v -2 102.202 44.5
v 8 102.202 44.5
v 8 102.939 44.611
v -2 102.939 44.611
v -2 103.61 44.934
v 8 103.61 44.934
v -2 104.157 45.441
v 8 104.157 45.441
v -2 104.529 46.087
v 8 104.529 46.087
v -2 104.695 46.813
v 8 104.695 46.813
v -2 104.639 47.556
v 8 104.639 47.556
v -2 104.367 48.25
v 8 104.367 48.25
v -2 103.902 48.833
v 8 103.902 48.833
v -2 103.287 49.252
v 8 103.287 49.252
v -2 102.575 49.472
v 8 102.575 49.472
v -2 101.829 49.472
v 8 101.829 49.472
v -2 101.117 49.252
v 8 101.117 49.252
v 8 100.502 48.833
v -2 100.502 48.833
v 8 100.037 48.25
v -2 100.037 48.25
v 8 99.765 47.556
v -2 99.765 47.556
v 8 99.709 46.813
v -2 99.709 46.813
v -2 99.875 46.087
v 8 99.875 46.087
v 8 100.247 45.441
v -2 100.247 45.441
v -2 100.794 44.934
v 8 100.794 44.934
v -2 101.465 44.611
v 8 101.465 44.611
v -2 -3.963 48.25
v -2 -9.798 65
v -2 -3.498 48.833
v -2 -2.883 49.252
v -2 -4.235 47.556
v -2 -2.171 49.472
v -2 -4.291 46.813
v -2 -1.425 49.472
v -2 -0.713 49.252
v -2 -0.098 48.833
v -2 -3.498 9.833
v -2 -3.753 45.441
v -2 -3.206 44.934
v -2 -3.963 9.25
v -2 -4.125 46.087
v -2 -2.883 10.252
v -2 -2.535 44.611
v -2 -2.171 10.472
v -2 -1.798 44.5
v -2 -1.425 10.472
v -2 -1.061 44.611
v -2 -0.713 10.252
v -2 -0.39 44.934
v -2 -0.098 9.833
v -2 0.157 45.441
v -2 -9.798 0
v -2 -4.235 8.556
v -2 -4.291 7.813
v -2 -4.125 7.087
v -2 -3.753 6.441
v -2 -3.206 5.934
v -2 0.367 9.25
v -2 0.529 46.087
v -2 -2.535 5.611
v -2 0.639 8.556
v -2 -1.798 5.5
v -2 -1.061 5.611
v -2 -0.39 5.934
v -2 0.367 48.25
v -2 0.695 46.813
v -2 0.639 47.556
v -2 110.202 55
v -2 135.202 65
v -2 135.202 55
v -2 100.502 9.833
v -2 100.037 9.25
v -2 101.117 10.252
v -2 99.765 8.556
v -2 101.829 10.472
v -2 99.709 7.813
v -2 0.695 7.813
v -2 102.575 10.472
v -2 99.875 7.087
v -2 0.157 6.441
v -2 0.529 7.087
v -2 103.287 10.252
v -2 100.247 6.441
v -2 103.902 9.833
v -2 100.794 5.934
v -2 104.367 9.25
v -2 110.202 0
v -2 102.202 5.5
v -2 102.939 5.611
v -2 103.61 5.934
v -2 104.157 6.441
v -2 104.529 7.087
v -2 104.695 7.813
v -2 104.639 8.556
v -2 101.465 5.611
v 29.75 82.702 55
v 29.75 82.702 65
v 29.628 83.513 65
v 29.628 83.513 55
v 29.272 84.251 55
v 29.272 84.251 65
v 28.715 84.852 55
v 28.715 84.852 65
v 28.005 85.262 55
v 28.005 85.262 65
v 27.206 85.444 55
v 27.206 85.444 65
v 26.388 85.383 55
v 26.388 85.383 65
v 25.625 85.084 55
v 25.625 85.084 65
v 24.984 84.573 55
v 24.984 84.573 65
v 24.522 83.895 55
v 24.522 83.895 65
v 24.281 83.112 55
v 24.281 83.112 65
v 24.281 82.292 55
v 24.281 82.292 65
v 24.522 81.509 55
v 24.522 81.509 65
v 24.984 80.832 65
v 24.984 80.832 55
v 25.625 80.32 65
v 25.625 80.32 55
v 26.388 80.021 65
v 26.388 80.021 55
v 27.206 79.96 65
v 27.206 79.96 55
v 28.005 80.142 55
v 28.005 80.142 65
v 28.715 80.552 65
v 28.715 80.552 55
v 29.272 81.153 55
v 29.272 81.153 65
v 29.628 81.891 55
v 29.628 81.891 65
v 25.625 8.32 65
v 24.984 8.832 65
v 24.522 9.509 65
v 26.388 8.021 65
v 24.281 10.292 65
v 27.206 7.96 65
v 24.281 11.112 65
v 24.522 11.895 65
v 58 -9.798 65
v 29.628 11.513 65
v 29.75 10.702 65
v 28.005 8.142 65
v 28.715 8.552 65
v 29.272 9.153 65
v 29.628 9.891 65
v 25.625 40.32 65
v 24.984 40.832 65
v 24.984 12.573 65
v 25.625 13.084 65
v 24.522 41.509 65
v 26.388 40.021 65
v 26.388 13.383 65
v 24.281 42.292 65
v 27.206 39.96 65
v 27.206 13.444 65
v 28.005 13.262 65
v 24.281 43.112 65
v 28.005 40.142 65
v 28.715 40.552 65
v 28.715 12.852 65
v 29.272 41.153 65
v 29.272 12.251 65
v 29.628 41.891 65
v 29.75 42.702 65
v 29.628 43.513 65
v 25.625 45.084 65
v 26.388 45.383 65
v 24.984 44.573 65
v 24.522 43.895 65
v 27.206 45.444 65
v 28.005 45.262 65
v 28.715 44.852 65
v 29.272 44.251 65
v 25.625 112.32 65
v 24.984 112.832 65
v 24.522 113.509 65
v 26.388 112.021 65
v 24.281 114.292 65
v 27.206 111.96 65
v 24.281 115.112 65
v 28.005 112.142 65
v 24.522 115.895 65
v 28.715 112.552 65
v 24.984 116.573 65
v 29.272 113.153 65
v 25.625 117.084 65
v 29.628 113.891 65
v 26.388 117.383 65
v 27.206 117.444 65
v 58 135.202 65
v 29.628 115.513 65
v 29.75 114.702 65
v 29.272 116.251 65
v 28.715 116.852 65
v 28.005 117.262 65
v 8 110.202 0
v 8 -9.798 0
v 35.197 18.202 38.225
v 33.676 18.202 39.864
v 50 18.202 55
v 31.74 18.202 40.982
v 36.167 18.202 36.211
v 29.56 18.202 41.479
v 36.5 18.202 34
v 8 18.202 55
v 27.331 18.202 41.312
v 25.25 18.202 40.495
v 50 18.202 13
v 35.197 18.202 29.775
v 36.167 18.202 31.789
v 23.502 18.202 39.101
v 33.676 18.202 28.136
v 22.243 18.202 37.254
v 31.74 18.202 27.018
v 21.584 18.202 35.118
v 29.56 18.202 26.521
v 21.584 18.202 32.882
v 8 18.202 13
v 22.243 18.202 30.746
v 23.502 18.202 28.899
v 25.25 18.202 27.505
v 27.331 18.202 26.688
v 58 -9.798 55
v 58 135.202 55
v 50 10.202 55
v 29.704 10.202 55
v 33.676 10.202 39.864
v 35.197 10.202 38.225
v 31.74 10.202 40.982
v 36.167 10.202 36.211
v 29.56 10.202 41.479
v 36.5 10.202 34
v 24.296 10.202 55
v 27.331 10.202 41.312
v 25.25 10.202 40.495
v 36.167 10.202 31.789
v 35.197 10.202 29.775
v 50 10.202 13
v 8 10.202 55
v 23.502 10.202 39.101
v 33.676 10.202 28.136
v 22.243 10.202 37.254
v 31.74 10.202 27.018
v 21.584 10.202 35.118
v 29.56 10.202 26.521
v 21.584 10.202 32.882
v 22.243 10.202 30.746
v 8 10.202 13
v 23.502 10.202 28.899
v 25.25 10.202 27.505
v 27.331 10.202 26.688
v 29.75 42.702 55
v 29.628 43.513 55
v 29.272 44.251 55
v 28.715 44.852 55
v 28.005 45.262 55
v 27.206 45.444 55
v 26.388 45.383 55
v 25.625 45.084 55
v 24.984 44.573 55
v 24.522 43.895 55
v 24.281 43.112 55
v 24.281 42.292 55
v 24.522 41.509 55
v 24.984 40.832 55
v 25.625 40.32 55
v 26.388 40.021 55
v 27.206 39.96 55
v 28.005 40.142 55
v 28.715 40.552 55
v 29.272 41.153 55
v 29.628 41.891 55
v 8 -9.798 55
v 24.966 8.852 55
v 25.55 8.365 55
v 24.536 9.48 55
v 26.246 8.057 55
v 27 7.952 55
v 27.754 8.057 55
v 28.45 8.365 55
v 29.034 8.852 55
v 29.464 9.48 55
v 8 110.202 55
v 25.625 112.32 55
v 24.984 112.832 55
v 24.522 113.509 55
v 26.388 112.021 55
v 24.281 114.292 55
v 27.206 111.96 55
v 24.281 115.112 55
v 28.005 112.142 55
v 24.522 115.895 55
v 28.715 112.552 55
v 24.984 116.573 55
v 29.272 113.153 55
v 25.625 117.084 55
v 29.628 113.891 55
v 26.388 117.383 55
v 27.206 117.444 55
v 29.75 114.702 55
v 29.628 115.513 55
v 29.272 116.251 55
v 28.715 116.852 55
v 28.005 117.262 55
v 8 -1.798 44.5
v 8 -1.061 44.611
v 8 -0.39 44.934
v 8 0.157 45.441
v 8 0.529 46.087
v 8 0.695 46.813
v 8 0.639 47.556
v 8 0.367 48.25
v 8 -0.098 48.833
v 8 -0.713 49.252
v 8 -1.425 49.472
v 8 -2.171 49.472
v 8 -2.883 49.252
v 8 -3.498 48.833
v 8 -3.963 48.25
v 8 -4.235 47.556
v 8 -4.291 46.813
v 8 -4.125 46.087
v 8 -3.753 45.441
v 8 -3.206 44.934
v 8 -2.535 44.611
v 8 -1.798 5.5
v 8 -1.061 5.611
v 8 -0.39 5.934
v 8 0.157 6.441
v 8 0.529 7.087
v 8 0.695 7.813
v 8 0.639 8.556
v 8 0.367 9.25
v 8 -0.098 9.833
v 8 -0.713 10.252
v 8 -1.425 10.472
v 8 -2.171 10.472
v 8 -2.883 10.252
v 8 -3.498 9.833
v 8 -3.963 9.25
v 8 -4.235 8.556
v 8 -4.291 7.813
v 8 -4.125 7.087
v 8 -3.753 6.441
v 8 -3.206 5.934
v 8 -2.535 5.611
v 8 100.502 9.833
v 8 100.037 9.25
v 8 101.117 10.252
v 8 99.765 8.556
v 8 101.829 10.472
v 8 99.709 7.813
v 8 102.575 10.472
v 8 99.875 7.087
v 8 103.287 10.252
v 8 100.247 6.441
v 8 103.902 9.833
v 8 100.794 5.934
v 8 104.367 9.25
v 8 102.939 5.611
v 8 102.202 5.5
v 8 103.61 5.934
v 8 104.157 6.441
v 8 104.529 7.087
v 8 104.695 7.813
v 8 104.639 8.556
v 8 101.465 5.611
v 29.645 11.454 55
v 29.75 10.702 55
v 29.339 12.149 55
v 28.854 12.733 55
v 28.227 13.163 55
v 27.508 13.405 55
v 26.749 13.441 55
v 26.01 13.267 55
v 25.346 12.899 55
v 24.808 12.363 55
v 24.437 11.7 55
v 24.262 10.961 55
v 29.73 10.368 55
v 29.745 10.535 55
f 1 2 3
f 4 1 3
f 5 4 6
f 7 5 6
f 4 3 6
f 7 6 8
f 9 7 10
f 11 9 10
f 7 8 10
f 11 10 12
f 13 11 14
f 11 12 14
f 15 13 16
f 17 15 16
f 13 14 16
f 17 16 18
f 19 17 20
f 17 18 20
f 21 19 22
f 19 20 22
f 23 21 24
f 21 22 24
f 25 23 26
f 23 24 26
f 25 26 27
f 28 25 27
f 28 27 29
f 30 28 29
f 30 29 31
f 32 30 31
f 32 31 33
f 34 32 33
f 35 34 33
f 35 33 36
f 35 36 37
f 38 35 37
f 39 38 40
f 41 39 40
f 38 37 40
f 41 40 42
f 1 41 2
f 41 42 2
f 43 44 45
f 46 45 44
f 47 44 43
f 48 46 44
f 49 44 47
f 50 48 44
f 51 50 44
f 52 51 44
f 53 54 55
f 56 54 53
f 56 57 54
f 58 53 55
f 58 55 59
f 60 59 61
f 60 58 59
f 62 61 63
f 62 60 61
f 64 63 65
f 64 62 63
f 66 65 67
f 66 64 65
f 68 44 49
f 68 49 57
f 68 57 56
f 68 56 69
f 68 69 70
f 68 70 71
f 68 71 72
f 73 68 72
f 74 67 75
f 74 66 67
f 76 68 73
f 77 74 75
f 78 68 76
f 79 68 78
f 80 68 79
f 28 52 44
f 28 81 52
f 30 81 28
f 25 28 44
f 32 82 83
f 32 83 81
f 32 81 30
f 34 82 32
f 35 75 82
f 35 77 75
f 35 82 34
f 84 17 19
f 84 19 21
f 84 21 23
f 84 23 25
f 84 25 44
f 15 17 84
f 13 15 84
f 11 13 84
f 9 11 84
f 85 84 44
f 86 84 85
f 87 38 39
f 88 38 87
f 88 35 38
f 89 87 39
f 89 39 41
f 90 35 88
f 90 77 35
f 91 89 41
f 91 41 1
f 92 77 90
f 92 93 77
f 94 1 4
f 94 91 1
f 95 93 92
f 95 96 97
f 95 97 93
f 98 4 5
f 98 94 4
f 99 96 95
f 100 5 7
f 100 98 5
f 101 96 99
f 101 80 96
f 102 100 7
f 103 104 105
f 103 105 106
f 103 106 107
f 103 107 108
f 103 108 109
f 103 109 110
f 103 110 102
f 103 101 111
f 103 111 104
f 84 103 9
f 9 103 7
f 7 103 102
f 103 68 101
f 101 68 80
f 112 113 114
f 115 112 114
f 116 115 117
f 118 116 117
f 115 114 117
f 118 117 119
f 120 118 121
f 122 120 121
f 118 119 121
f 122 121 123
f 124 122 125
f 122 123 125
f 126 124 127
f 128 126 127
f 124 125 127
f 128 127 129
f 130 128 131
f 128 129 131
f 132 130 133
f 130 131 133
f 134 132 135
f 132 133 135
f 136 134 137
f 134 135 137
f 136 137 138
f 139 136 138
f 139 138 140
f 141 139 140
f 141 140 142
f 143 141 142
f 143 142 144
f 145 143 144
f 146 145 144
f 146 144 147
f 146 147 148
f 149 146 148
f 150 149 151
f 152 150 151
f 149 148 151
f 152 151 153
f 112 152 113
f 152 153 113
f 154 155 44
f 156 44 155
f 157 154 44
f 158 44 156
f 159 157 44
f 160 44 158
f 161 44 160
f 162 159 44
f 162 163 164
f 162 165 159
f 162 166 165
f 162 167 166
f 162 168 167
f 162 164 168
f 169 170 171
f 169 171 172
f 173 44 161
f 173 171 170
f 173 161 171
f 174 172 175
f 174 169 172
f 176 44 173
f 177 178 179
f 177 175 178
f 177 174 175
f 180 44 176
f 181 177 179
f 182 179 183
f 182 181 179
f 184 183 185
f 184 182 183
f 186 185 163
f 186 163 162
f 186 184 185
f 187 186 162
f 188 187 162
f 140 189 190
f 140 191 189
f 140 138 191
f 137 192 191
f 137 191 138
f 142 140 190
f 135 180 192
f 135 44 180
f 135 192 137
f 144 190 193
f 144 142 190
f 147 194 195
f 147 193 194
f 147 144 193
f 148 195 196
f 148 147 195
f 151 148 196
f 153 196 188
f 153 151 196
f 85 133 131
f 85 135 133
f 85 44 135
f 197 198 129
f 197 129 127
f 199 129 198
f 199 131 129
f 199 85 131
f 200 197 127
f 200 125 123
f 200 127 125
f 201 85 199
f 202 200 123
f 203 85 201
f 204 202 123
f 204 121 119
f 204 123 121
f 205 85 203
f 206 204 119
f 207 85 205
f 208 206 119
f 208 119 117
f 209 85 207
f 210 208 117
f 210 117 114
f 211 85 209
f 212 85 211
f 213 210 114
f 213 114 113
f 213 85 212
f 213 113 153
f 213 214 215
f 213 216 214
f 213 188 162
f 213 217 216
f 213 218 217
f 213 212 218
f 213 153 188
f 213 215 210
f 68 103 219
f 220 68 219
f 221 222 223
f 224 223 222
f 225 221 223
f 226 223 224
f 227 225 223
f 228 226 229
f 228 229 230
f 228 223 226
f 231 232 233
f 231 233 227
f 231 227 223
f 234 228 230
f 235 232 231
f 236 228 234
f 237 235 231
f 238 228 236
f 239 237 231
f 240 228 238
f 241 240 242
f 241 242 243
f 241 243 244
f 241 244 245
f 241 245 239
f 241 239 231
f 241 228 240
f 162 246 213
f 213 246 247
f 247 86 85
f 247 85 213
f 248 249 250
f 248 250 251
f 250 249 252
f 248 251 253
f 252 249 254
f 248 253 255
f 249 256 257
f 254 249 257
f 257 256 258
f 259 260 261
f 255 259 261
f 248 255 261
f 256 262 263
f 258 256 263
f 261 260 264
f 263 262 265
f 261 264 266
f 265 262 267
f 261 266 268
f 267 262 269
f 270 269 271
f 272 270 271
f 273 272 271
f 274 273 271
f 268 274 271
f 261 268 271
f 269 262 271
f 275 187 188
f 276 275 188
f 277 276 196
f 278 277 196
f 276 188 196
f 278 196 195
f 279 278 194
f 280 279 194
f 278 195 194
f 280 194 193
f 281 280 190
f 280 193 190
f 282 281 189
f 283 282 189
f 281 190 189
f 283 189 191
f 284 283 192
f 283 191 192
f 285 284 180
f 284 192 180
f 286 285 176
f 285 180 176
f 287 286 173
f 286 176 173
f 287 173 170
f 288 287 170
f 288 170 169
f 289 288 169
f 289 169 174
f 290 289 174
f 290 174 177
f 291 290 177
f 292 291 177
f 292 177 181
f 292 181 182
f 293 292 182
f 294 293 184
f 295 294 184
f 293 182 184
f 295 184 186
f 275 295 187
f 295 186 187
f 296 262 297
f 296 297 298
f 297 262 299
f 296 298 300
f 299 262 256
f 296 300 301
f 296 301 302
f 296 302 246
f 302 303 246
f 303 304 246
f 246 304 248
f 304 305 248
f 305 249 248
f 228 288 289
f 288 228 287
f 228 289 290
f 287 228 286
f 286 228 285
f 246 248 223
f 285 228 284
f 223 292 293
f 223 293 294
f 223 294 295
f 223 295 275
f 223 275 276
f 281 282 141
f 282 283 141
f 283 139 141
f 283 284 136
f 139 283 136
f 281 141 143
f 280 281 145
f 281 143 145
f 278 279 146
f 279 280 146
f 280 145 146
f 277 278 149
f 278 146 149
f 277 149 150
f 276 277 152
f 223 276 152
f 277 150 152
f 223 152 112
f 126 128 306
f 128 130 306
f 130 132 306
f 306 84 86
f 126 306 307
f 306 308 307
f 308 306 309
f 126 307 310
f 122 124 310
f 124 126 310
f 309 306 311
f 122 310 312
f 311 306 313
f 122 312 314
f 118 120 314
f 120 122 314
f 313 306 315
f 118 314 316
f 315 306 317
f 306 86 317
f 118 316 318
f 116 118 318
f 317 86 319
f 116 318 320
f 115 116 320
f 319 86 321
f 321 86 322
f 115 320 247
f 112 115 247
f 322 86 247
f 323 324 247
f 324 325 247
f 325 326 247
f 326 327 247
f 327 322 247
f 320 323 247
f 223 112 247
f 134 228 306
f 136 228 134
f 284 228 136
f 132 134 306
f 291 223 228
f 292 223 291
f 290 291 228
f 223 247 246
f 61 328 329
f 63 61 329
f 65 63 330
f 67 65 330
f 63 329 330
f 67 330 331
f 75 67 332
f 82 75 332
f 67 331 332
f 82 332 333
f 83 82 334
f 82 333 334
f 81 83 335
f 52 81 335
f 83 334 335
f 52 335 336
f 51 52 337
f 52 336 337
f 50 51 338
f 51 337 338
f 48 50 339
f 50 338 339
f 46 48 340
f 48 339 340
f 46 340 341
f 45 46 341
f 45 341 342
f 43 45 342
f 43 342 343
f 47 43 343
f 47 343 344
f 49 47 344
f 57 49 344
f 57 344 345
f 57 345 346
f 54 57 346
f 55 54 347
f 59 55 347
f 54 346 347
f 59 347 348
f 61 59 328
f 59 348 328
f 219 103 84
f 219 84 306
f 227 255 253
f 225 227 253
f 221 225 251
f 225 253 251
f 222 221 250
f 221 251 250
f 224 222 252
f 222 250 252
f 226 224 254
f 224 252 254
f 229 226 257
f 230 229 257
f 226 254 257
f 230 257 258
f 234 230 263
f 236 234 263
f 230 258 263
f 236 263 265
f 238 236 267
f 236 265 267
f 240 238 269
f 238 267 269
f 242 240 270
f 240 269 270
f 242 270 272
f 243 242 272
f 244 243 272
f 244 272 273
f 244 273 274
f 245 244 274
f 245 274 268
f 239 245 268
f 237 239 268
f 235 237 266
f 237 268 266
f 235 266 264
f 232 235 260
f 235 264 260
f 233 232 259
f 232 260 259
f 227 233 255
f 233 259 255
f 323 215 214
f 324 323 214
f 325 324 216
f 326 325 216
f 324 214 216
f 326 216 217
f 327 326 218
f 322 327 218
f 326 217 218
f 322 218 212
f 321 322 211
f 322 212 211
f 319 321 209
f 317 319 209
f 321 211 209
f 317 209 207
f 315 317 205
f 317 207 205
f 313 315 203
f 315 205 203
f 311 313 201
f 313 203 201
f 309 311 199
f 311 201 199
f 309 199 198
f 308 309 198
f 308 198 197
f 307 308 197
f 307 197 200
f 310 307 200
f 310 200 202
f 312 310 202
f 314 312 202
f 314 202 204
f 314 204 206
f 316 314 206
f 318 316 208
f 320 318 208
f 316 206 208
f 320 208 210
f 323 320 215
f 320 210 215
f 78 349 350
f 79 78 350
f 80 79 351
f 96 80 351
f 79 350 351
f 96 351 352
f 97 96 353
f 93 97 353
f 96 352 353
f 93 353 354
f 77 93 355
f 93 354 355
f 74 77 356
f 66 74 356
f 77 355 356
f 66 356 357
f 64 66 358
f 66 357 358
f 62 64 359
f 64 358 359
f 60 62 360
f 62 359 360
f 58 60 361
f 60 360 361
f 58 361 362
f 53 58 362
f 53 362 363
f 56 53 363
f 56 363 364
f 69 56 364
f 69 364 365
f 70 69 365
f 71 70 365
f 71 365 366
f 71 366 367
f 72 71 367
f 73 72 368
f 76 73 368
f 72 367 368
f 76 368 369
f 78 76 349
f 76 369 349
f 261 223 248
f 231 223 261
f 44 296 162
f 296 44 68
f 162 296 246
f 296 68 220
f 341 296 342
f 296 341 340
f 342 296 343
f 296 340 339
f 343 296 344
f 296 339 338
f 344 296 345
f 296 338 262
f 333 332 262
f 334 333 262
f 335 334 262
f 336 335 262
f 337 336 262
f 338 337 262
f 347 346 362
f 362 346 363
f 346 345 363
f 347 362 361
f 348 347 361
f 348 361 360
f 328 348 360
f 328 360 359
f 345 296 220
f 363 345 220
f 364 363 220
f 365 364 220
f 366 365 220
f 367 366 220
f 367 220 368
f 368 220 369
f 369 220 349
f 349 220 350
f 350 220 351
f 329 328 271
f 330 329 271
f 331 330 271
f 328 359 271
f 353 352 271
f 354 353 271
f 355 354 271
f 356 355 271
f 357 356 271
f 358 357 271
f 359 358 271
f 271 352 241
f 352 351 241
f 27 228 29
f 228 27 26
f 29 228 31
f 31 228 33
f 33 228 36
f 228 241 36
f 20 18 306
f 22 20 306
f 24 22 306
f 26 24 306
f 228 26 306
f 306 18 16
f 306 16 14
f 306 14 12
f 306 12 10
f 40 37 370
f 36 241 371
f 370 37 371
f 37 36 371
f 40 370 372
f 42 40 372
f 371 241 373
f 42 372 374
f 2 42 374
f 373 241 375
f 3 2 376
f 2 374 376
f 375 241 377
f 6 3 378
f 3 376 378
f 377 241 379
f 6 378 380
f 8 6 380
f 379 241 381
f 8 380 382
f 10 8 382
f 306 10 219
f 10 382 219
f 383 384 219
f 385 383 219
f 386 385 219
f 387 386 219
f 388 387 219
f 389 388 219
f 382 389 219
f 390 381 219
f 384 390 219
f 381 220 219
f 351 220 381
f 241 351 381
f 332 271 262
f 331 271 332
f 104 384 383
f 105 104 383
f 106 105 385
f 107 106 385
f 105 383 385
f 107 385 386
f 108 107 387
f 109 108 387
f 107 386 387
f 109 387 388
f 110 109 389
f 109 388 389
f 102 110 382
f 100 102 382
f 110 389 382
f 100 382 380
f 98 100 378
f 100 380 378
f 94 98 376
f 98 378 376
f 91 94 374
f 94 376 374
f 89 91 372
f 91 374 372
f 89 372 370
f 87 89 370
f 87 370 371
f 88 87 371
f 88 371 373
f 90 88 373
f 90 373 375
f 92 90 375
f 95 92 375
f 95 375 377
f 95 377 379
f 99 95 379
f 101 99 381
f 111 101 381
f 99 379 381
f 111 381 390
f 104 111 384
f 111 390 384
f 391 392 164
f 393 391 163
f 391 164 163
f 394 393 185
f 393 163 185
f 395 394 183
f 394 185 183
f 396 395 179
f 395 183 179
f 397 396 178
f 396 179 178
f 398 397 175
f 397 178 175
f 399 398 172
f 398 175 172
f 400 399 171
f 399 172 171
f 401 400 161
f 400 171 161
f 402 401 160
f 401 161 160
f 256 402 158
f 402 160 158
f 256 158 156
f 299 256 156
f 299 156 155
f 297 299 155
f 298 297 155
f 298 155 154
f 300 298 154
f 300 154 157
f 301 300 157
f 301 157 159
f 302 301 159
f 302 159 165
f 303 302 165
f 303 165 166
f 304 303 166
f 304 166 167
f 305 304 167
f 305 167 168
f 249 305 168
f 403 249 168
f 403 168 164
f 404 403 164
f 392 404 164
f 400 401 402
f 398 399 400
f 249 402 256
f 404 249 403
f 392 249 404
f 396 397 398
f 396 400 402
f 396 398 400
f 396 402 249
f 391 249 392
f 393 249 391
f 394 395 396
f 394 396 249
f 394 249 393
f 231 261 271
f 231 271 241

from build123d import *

# Parameters (mm, degrees)
SKETCH1_W           = 10
SKETCH1_H           = 120
BOSS_EXTRUDE1_DEPTH = 55
SKETCH2_W           = 42
SKETCH2_H           = 8
BOSS_EXTRUDE2_DEPTH = 42
SKETCH3_R           = 7.5
CUT_EXTRUDE1_DEPTH  = 8
SKETCH5_W           = 60
SKETCH5_H           = 145
BOSS_EXTRUDE4_DEPTH = 10
SKETCH6_R           = 2.75
CUT_EXTRUDE2_DEPTH  = 10
SKETCH7_R           = 2.5
CUT_EXTRUDE3_DEPTH  = 10


with BuildPart() as part:
    # Sketch1 → Boss-Extrude1 (new body)
    with BuildSketch(Plane.XY):
        with Locations((3, 50.202041029)):
            Rectangle(SKETCH1_W, SKETCH1_H)
    extrude(amount=BOSS_EXTRUDE1_DEPTH)

    # Sketch2 → Boss-Extrude2 (add)
    with BuildSketch(Plane(origin=(8, 0, 0), x_dir=(0, 0, -1), z_dir=(1, 0, 0))):
        with Locations((-34, 14.202041029)):
            Rectangle(SKETCH2_W, SKETCH2_H)
    extrude(amount=BOSS_EXTRUDE2_DEPTH)

    # Sketch3 → Cut-Extrude1 (cut)
    with BuildSketch(Plane.XZ.offset(-10.202041029)):
        with Locations((29, 34)):
            Circle(SKETCH3_R)
    extrude(amount=-CUT_EXTRUDE1_DEPTH, mode=Mode.SUBTRACT)

    # Sketch5 → Boss-Extrude4 (add)
    with BuildSketch(Plane.XY.offset(55)):
        with Locations((28, 62.702041029)):
            Rectangle(SKETCH5_W, SKETCH5_H)
    extrude(amount=BOSS_EXTRUDE4_DEPTH)

    # Sketch6 → Cut-Extrude2 (cut)
    with BuildSketch(Plane.XY.offset(65)):
        with Locations((27, 114.702041029)):
            Circle(SKETCH6_R)
        with Locations((27, 82.702041029)):
            Circle(SKETCH6_R)
        with Locations((27, 42.702041029)):
            Circle(SKETCH6_R)
        with Locations((27, 10.702041029)):
            Circle(SKETCH6_R)
    extrude(amount=-CUT_EXTRUDE2_DEPTH, mode=Mode.SUBTRACT)

    # Sketch7 → Cut-Extrude3 (cut)
    with BuildSketch(Plane(origin=(8, 0, 0), x_dir=(0, 0, -1), z_dir=(1, 0, 0))):
        with Locations((-47, 102.202041029)):
            Circle(SKETCH7_R)
        with Locations((-8, 102.202041029)):
            Circle(SKETCH7_R)
        with Locations((-47, -1.797958971)):
            Circle(SKETCH7_R)
        with Locations((-8, -1.797958971)):
            Circle(SKETCH7_R)
    extrude(amount=-CUT_EXTRUDE3_DEPTH, mode=Mode.SUBTRACT)


solid = part.part
